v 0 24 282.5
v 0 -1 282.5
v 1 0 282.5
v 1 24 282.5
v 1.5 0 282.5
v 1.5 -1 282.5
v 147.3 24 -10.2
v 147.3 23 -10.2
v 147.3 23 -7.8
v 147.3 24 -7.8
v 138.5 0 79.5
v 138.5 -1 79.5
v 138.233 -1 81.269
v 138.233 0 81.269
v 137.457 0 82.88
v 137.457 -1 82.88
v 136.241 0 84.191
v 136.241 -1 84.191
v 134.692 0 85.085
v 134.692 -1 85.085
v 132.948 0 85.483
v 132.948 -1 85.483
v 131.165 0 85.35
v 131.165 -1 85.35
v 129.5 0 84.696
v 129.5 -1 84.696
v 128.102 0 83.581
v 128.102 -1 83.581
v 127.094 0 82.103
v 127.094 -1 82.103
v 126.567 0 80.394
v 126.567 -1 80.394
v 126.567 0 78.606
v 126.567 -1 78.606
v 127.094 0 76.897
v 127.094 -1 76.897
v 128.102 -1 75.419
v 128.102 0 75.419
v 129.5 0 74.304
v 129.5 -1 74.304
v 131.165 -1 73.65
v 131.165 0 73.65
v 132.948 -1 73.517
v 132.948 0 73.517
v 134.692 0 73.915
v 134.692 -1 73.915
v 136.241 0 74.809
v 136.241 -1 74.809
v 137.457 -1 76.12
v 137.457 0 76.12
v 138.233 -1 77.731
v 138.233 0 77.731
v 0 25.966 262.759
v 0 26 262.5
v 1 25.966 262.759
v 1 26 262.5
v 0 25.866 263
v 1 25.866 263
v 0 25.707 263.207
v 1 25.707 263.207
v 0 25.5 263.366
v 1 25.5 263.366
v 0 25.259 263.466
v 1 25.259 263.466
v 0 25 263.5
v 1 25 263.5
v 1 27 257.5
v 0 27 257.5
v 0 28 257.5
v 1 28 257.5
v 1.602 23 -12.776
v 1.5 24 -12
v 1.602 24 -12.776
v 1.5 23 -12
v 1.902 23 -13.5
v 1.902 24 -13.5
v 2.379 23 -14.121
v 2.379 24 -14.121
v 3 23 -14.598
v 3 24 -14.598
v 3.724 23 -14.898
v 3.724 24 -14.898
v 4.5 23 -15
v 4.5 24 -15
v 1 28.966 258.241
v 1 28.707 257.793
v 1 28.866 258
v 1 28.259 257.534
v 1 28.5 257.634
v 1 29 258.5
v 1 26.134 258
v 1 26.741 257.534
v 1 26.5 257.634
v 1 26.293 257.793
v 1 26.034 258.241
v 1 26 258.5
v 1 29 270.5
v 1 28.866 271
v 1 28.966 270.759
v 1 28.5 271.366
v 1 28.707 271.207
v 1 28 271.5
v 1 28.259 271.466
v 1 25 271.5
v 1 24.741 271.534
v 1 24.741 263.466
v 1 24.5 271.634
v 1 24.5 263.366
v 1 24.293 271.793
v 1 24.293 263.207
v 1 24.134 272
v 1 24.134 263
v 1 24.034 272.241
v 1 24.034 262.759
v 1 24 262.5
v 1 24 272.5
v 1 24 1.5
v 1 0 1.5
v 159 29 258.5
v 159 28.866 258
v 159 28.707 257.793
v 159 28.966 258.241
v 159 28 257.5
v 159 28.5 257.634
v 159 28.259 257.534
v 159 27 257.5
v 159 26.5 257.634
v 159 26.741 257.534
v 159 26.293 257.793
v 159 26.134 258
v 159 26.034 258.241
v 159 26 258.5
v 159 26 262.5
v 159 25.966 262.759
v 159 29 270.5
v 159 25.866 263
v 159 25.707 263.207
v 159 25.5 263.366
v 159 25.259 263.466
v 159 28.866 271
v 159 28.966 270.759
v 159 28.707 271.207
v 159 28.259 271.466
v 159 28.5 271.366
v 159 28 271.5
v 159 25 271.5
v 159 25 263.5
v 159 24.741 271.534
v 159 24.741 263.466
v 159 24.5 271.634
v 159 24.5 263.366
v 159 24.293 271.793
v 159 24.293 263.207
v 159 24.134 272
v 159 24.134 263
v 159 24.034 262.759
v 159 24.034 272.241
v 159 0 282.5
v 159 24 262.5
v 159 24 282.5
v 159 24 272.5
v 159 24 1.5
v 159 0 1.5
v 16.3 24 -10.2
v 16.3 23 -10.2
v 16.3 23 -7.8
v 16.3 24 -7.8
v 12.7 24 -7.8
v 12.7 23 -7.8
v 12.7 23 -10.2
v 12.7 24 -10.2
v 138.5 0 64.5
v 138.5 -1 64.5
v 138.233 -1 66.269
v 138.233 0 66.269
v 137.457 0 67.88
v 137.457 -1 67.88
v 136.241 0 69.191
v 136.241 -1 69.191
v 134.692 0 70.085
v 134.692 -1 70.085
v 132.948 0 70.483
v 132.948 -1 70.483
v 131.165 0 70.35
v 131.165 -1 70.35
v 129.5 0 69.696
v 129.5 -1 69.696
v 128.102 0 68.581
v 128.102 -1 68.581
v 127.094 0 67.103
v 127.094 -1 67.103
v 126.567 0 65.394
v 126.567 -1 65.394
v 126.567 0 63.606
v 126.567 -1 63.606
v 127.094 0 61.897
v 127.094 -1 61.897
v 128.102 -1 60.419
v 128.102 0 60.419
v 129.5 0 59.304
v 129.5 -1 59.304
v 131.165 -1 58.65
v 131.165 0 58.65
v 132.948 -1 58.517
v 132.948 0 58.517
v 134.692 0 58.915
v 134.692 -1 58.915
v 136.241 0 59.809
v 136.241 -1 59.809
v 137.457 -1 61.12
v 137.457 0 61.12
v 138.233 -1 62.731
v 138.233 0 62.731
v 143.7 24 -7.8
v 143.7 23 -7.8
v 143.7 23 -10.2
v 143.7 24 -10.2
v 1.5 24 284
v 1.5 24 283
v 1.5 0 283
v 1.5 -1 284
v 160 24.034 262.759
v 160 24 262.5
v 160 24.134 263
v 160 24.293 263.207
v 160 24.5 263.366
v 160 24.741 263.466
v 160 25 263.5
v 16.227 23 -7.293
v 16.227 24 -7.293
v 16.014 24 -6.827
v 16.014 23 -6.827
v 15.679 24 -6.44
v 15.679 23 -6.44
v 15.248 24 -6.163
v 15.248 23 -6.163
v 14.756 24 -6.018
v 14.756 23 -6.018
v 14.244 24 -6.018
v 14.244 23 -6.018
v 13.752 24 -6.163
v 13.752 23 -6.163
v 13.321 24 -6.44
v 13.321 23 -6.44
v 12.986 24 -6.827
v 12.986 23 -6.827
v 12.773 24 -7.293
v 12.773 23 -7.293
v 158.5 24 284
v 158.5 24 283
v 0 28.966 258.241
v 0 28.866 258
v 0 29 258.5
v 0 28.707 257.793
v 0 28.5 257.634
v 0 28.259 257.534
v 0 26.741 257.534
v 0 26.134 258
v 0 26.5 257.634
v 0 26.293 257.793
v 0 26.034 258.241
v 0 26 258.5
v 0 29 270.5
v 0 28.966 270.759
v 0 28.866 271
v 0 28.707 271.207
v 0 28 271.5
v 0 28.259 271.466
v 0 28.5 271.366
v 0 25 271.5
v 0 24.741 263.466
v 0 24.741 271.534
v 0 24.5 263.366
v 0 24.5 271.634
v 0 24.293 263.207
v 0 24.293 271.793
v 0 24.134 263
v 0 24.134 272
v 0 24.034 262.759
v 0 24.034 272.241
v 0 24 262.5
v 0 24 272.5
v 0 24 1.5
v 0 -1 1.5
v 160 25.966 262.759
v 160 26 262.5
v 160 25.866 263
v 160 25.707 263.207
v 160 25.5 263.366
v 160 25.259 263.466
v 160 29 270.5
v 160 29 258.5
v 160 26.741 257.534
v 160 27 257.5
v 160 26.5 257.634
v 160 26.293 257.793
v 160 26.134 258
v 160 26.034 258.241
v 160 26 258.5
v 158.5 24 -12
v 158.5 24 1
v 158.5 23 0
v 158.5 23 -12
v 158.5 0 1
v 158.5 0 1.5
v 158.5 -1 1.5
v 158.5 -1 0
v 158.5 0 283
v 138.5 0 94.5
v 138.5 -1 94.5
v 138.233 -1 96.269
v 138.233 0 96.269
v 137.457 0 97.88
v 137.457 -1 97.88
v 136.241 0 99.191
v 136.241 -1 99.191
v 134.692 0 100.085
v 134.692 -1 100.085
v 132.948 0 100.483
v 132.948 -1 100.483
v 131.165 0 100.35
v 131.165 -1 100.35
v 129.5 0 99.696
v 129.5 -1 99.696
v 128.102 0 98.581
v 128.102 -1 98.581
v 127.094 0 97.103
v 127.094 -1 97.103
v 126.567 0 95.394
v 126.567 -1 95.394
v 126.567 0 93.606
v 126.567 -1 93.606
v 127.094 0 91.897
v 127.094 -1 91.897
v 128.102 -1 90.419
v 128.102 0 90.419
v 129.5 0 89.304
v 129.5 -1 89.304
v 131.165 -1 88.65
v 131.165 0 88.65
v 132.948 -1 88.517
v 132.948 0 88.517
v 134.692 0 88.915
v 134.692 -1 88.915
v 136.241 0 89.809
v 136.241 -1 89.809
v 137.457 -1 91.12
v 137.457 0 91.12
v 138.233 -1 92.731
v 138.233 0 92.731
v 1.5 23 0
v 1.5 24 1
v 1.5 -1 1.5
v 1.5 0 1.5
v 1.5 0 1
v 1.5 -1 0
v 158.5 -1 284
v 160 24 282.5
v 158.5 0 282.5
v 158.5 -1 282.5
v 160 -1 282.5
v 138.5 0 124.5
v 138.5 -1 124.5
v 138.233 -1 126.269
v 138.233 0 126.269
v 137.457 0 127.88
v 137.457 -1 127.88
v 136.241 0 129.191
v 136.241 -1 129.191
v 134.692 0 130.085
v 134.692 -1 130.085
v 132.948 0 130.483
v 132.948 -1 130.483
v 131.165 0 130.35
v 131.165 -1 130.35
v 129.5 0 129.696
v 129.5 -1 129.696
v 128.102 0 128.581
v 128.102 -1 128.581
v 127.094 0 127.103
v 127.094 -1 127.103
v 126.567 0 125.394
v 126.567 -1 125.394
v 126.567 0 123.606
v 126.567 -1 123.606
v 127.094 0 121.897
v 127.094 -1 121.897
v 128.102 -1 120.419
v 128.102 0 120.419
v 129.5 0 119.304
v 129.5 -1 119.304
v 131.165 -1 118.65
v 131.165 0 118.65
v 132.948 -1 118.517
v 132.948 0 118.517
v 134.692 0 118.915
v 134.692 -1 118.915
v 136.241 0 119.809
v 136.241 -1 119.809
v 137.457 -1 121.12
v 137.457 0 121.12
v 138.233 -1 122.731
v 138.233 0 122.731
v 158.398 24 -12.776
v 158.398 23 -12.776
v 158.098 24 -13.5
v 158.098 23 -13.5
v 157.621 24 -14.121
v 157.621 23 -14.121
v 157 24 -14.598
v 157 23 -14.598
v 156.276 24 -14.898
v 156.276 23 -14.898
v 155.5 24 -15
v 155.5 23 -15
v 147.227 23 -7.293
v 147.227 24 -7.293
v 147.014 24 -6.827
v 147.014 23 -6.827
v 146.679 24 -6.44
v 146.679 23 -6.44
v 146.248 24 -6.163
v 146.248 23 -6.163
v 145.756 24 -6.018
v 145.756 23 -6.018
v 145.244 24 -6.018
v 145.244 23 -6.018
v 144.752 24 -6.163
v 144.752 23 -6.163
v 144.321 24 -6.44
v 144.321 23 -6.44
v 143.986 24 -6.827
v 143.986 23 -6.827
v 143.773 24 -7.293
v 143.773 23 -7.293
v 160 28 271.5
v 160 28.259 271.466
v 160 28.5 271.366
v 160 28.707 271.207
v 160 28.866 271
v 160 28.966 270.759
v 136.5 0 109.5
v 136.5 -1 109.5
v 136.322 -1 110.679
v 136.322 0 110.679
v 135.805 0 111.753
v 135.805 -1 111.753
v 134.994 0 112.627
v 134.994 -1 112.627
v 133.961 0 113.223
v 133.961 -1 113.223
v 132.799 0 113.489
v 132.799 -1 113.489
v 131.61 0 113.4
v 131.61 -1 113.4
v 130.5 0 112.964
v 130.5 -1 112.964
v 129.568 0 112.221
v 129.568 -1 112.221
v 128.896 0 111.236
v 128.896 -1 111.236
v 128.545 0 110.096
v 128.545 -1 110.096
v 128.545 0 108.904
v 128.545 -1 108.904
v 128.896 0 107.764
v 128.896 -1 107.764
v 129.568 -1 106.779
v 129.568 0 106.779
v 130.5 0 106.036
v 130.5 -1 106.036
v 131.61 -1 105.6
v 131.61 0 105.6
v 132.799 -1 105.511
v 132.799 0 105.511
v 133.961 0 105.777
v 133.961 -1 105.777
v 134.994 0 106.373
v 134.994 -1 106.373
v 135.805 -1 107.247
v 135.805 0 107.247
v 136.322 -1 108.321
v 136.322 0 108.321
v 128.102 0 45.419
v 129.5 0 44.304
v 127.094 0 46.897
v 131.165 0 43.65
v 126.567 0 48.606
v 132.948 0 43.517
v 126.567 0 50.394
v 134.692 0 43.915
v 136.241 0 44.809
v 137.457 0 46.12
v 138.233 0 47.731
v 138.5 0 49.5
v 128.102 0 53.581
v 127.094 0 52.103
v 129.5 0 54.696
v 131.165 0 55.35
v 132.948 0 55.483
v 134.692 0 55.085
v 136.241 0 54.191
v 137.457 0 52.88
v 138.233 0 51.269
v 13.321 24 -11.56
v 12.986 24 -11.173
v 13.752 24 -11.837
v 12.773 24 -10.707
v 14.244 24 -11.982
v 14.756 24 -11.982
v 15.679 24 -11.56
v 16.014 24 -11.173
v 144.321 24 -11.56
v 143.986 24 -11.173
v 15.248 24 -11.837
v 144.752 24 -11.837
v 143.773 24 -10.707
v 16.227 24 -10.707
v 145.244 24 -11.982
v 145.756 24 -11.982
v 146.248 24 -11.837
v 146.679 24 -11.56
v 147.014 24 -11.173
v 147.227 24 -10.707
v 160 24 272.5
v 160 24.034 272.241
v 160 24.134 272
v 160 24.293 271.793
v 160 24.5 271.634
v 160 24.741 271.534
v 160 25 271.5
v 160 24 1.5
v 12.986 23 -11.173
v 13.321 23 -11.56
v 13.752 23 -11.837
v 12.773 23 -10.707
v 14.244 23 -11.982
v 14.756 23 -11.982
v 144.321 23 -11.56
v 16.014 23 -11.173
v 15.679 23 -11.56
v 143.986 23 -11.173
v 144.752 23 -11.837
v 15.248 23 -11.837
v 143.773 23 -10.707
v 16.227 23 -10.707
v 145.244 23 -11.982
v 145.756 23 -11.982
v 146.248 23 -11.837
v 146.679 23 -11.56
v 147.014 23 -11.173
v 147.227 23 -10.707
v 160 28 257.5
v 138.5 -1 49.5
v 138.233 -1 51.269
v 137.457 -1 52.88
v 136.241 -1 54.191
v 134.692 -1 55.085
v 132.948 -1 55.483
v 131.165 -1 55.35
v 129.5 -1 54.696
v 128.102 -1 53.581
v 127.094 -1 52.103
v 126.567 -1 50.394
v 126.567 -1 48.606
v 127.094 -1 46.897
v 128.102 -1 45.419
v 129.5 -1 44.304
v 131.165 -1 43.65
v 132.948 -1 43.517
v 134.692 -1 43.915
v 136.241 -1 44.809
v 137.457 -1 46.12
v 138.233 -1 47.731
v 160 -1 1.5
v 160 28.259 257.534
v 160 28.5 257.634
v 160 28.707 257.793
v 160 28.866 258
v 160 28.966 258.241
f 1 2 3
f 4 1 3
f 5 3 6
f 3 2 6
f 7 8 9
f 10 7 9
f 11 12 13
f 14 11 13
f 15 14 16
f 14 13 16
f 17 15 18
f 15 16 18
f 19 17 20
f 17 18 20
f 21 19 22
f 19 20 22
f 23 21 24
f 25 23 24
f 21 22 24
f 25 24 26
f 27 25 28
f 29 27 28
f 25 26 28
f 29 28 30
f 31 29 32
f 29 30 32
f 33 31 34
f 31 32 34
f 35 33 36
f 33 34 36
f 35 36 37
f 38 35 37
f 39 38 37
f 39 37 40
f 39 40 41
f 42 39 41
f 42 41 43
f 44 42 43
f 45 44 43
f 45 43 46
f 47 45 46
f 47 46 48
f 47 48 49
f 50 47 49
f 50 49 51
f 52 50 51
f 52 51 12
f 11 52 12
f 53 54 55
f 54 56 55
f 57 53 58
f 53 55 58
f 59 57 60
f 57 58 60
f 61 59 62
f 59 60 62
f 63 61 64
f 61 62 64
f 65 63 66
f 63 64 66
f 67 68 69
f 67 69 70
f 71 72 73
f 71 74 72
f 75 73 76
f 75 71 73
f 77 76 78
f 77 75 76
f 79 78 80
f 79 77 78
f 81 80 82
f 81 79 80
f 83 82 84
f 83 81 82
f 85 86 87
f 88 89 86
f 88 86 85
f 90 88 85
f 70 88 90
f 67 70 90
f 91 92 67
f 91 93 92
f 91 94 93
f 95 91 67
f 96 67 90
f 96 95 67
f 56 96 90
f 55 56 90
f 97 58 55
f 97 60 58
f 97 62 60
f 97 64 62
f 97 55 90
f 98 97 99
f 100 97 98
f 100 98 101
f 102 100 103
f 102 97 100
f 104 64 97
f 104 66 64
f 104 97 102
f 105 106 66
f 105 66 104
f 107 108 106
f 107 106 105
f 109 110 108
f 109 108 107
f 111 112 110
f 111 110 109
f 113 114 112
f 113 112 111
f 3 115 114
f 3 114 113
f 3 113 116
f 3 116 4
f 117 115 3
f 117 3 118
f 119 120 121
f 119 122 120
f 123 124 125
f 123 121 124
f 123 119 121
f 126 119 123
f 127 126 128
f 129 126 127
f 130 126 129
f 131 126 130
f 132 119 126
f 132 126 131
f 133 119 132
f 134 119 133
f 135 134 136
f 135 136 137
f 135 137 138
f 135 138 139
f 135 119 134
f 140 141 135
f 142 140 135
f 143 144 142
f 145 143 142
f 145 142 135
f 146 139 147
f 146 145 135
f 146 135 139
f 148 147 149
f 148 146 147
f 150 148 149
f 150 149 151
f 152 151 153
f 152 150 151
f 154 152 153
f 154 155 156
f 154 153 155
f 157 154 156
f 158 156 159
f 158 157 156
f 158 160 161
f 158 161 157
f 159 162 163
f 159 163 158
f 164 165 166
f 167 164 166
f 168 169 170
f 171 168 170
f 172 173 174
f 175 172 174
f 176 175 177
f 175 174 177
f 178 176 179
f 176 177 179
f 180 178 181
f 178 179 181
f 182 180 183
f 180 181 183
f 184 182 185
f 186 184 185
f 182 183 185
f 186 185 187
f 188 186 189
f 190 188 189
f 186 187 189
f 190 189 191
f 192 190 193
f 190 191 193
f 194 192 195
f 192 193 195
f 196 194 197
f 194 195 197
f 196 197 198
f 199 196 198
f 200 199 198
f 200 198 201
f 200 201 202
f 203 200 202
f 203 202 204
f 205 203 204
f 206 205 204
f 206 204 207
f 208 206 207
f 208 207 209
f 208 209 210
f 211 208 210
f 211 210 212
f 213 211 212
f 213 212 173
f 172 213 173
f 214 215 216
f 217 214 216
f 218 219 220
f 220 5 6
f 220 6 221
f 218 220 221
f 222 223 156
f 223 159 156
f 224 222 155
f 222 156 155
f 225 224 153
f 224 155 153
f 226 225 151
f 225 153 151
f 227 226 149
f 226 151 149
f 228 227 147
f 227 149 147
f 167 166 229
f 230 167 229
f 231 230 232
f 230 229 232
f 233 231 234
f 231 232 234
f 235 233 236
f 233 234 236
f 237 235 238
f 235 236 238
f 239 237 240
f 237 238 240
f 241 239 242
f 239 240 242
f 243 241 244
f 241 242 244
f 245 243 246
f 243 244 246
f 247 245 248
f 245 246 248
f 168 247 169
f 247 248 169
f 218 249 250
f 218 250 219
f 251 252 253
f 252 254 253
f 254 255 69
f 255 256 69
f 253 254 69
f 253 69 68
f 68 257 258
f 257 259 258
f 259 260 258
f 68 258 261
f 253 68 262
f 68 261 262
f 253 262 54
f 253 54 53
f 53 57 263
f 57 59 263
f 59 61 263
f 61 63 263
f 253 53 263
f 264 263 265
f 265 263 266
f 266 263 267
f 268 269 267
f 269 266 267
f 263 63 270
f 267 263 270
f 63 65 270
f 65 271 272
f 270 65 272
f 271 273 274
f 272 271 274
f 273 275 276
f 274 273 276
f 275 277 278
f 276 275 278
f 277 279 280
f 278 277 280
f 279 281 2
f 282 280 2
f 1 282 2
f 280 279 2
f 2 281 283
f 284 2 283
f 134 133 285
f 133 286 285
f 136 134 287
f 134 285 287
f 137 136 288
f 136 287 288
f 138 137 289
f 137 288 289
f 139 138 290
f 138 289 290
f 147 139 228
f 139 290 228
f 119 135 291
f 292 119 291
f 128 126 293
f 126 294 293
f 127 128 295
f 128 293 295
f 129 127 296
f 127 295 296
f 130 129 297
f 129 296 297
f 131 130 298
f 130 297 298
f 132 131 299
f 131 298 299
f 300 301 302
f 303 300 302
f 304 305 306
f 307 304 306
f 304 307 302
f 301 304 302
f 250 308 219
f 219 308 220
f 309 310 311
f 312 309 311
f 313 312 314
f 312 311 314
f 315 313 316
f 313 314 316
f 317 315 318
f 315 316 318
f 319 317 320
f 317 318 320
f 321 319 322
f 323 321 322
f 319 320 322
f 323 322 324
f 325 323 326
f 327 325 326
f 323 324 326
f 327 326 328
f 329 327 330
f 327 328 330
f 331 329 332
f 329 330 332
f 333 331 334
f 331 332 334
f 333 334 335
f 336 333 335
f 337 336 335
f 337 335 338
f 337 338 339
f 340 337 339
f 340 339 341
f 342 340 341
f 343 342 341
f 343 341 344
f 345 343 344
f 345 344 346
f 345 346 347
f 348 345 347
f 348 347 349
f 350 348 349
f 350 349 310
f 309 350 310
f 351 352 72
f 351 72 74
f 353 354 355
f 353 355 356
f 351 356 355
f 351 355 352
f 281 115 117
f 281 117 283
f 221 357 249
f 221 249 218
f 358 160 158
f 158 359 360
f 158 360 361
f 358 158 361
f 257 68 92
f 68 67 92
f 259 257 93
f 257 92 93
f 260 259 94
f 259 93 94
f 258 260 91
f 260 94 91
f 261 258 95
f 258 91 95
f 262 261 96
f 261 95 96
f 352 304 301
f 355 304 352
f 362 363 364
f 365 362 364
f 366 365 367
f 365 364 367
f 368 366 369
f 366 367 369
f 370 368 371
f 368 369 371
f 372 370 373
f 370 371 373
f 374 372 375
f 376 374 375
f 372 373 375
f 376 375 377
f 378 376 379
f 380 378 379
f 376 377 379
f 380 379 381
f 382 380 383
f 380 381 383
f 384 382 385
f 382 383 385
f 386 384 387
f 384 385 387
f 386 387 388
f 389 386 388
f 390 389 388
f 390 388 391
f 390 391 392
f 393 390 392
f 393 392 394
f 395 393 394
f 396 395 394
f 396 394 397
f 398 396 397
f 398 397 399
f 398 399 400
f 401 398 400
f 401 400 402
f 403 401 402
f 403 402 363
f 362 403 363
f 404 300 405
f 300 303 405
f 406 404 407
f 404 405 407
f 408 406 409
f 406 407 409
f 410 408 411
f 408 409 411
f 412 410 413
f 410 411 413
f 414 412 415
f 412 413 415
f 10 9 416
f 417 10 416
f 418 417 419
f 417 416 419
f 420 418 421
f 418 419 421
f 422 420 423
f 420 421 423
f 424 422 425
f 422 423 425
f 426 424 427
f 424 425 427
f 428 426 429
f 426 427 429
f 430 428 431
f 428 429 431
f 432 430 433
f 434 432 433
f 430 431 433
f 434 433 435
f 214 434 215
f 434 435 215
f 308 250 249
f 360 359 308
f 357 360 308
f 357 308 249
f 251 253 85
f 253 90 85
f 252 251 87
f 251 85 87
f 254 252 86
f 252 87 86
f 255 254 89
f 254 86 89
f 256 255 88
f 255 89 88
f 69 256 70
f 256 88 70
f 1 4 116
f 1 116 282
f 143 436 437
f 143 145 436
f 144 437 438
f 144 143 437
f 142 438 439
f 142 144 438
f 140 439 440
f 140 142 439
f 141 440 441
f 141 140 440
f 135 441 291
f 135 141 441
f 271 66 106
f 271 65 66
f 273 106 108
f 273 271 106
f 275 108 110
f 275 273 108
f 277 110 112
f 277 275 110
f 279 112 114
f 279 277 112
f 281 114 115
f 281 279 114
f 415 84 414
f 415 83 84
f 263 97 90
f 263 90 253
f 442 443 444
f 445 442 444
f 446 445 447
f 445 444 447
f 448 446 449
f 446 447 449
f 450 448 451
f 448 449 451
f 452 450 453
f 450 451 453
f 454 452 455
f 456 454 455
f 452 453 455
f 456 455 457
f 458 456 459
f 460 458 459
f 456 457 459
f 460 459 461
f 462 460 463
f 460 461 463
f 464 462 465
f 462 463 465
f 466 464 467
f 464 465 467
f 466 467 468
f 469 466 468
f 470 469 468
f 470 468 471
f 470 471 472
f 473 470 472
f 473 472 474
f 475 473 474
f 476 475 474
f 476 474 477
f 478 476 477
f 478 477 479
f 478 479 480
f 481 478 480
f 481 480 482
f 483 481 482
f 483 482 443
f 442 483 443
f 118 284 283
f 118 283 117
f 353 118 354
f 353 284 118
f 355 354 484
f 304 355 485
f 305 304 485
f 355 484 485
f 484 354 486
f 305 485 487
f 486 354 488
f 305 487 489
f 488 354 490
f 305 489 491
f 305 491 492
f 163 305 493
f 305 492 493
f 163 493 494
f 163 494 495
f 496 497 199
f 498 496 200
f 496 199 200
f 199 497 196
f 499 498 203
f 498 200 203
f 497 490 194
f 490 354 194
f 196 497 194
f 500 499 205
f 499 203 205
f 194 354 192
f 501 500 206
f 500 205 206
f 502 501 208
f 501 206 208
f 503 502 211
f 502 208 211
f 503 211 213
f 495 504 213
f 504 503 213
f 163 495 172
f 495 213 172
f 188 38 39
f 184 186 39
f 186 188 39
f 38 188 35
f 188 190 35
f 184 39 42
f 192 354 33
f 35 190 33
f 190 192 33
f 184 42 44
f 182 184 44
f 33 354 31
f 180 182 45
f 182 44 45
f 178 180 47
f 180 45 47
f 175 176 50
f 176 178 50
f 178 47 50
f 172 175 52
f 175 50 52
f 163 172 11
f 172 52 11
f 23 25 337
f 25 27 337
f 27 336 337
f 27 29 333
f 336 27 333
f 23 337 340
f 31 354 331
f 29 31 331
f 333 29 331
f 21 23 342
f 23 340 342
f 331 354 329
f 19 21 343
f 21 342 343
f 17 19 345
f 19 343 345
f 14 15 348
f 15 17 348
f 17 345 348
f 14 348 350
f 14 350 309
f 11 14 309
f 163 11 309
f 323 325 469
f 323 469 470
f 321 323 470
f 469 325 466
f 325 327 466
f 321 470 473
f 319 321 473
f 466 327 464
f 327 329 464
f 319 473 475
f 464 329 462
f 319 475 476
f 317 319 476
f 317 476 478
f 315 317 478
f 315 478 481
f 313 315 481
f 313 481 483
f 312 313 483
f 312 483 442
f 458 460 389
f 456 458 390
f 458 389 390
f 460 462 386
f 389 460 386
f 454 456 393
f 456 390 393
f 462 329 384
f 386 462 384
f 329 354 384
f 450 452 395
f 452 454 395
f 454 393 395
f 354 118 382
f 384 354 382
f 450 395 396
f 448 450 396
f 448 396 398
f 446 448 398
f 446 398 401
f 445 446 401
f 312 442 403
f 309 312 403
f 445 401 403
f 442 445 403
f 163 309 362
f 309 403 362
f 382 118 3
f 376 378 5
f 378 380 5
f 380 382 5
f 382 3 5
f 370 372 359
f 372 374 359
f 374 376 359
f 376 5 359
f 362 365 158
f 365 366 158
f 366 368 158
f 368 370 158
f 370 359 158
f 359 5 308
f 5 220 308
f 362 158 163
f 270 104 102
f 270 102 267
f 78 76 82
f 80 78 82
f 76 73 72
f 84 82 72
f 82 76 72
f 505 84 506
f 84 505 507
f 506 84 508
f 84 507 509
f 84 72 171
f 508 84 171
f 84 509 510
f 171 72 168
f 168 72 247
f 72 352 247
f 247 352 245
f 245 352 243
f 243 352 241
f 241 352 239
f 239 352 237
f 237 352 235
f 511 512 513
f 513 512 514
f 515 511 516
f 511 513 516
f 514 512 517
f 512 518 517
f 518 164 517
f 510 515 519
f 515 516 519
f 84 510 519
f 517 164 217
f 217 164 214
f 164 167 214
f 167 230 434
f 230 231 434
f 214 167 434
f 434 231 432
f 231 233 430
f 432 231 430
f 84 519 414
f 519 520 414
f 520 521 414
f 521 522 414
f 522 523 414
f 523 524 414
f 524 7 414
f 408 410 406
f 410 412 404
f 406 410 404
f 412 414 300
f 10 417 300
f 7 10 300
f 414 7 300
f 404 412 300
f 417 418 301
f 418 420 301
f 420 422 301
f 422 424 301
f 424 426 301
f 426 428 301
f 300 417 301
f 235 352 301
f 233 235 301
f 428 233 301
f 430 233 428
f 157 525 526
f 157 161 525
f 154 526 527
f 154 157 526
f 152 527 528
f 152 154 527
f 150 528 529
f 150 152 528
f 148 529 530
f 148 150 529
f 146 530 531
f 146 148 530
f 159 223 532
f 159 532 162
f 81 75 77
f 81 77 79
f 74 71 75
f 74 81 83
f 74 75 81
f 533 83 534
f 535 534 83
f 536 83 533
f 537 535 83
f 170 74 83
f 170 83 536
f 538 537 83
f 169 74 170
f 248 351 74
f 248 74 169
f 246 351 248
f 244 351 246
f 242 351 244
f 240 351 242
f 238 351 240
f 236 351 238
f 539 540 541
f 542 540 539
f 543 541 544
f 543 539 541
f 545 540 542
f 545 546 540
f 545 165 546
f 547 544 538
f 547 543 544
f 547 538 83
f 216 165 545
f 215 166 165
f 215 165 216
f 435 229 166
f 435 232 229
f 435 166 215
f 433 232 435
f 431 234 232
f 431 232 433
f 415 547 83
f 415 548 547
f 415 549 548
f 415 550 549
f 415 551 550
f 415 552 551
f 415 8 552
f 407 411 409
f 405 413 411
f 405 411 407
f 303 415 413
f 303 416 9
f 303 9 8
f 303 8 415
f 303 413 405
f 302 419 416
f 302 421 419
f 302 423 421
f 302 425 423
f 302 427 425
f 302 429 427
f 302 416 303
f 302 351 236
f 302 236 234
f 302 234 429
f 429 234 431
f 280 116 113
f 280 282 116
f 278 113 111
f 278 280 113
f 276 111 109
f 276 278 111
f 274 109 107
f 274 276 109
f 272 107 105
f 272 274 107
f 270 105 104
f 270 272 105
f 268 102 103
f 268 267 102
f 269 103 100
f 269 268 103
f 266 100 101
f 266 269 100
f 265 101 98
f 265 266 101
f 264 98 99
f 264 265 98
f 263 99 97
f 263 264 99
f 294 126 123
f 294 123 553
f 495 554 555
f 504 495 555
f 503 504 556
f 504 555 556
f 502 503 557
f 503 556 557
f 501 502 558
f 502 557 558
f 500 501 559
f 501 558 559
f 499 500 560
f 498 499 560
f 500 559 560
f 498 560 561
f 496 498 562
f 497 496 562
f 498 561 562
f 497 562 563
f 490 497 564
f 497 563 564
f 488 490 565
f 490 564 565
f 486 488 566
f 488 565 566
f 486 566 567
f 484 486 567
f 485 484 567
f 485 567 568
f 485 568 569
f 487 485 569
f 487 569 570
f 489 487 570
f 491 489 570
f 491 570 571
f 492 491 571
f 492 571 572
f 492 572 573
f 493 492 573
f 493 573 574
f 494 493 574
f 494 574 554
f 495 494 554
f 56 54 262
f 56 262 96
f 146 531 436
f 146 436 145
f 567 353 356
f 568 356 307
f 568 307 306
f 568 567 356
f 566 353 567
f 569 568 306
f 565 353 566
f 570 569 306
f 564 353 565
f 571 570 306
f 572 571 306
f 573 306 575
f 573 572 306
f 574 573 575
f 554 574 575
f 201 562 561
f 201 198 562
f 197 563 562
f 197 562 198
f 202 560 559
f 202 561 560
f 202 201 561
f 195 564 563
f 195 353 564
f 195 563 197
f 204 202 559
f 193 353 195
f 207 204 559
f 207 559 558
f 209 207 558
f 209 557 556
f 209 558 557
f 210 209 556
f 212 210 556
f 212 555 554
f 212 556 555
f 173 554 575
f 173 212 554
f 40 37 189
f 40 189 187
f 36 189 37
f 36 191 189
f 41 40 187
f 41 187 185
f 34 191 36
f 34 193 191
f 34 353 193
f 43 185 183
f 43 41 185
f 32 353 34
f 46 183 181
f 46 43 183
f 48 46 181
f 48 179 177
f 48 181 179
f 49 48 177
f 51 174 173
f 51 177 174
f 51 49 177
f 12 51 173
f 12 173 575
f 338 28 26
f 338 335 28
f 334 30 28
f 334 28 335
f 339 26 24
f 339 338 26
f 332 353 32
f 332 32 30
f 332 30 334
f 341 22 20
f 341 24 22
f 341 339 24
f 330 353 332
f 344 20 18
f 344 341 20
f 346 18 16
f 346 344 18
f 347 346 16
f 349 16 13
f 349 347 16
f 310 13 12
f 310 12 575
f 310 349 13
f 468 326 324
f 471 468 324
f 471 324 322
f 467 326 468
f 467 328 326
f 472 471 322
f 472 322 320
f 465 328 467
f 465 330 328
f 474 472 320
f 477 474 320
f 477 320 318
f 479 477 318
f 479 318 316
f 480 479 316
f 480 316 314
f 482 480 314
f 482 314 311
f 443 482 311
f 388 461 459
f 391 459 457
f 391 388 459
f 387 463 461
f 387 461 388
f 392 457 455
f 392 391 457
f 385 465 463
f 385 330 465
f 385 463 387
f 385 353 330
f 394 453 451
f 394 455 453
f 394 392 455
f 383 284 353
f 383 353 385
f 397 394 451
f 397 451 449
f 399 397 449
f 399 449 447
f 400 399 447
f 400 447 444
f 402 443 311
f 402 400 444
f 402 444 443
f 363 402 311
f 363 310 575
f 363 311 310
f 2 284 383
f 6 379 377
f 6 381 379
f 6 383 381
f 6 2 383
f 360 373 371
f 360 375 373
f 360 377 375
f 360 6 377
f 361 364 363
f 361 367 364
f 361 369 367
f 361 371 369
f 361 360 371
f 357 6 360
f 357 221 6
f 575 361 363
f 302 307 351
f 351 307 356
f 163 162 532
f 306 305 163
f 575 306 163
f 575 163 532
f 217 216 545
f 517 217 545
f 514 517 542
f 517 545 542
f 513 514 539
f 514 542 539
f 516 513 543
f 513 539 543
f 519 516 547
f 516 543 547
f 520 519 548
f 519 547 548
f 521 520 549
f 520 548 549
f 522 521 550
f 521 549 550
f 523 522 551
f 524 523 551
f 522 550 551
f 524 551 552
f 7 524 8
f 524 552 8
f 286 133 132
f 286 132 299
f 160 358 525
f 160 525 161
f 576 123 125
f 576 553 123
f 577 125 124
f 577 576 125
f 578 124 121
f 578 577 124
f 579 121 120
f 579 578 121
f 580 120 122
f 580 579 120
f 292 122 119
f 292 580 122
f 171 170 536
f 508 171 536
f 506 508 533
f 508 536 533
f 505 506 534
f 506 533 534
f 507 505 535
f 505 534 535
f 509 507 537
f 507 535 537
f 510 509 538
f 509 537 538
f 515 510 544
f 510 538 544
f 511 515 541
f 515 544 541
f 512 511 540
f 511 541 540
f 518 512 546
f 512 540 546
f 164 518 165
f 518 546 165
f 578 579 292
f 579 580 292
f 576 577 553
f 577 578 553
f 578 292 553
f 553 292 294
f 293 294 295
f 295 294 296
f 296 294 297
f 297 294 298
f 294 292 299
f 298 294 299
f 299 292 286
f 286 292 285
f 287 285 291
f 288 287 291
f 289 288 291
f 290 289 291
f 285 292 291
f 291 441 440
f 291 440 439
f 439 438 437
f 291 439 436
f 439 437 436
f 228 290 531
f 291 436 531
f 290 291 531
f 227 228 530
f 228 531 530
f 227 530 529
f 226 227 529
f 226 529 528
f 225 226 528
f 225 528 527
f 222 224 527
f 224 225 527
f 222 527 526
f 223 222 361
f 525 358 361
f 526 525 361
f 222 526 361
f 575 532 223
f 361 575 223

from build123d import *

# Parameters (mm, degrees)
F0_W      = 160
F0_H      = 284
F1_DEPTH  = 1
F2_W      = 160
F2_H      = 284
F2_W_2    = 158
F2_H_2    = 282
F3_DEPTH  = 24
F4_W      = 1.5
F4_H      = 1.5
F5_DEPTH  = 25.001
F6_R      = 6
F6_R_2    = 4
F7_DEPTH  = 25.001
F8_W      = 157
F8_H      = 1
F9_DEPTH  = 15
F10_R     = 3
F12_DEPTH = 1.001
F13_W     = 1
F13_H     = 8
F14_DEPTH = 5
F15_W     = 1
F15_H     = 3
F16_DEPTH = 6
F17_R     = 0.99999
F18_R     = 0.99999


# Not quite as in the source:
# - a fillet or chamfer is up to 0.001 mm smaller than in the source, because OpenCascade refuses the exact size


with BuildPart() as f1:
    # F0 (on Front) → F1 (new body)
    with BuildSketch(Plane.XZ):
        with Locations((80, 142)):
            Rectangle(F0_W, F0_H)
    extrude(amount=F1_DEPTH)

    # F2 (on face) → F3 (join)
    with BuildSketch(Plane(origin=(0, 0, 0), x_dir=(-1, 0, 0), z_dir=(0, 1, 0))):
        with Locations((-80, 142)):
            Rectangle(F2_W, F2_H)
        with Locations((-80, 142)):
            Rectangle(F2_W_2, F2_H_2, mode=Mode.SUBTRACT)
    extrude(amount=F3_DEPTH)

    # F4 (on face) → F5 (cut, through all)
    with BuildSketch(Plane.XZ.offset(1)):
        with Locations((0.75, 283.25)):
            Rectangle(F4_W, F4_H)
        with Locations((159.25, 283.25)):
            Rectangle(F4_W, F4_H)
        with Locations((159.25, 0.75)):
            Rectangle(F4_W, F4_H)
        with Locations((0.75, 0.75)):
            Rectangle(F4_W, F4_H)
    extrude(amount=-F5_DEPTH, mode=Mode.SUBTRACT)

    # F6 (on face) → F7 (cut, through all)
    with BuildSketch(Plane.XZ.offset(1)):
        with Locations((132.5, 124.5)):
            Circle(F6_R)
        with Locations((132.5, 109.5)):
            Circle(F6_R_2)
        with Locations((132.5, 94.5)):
            Circle(F6_R)
        with Locations((132.5, 79.5)):
            Circle(F6_R)
        with Locations((132.5, 64.5)):
            Circle(F6_R)
        with Locations((132.5, 49.5)):
            Circle(F6_R)
    extrude(amount=-F7_DEPTH, mode=Mode.SUBTRACT)

    # F8 (on face) → F9 (join)
    with BuildSketch(Plane(origin=(0, 0, 0), x_dir=(1, 0, 0), z_dir=(0, 0, -1))):
        with Locations((80, -23.5)):
            Rectangle(F8_W, F8_H)
    extrude(amount=F9_DEPTH)

    # F10
    f10_edges = [f1.edges().sort_by_distance(p)[0] for p in [
        (1.5, 23.5, -15),
        (158.5, 23.5, -15),
    ]]
    fillet(f10_edges, radius=F10_R)

    # F11 (on face) → F12 (cut, through all)
    with BuildSketch(Plane.XZ.offset(-23)):
        with BuildLine():
            ThreePointArc((16.3, -7.8), (14.5, -6), (12.7, -7.8))
            Line((12.7, -7.8), (12.7, -10.2))
            ThreePointArc((12.7, -10.2), (14.5, -12), (16.3, -10.2))
            Line((16.3, -10.2), (16.3, -7.8))
        make_face()
        with BuildLine():
            ThreePointArc((147.3, -7.8), (145.5, -6), (143.7, -7.8))
            Line((143.7, -7.8), (143.7, -10.2))
            ThreePointArc((143.7, -10.2), (145.5, -12), (147.3, -10.2))
            Line((147.3, -10.2), (147.3, -7.8))
        make_face()
    extrude(amount=-F12_DEPTH, mode=Mode.SUBTRACT)

    # F13 (on face) → F14 (join)
    with BuildSketch(Plane(origin=(0, 24, 0), x_dir=(-1, 0, 0), z_dir=(0, 1, 0))):
        with Locations((-159.5, 267.5)):
            Rectangle(F13_W, F13_H)
        with Locations((-0.5, 267.5)):
            Rectangle(F13_W, F13_H)
    extrude(amount=F14_DEPTH)

    # F15 (on face) → F16 (join)
    with BuildSketch(Plane(origin=(0, 0, 263.5), x_dir=(1, 0, 0), z_dir=(0, 0, -1))):
        with Locations((159.5, -27.5)):
            Rectangle(F15_W, F15_H)
        with Locations((0.5, -27.5)):
            Rectangle(F15_W, F15_H)
    extrude(amount=F16_DEPTH)

    # F17 (radius 1 in the source; OpenCascade refuses exactly that, so slightly less here)
    f17_edges = [f1.edges().sort_by_distance(p)[0] for p in [
        (0.5, 26, 263.5),
        (0.5, 26, 257.5),
        (0.5, 29, 257.5),
        (0.5, 24, 263.5),
        (0.5, 24, 271.5),
        (0.5, 29, 271.5),
    ]]
    fillet(f17_edges, radius=F17_R)

    # F18 (radius 1 in the source; OpenCascade refuses exactly that, so slightly less here)
    f18_edges = [f1.edges().sort_by_distance(p)[0] for p in [
        (159.5, 24, 271.5),
        (159.5, 29, 271.5),
        (159.5, 29, 257.5),
        (159.5, 24, 263.5),
        (159.5, 26, 257.5),
        (159.5, 26, 263.5),
    ]]
    fillet(f18_edges, radius=F18_R)


solid = f1.part
